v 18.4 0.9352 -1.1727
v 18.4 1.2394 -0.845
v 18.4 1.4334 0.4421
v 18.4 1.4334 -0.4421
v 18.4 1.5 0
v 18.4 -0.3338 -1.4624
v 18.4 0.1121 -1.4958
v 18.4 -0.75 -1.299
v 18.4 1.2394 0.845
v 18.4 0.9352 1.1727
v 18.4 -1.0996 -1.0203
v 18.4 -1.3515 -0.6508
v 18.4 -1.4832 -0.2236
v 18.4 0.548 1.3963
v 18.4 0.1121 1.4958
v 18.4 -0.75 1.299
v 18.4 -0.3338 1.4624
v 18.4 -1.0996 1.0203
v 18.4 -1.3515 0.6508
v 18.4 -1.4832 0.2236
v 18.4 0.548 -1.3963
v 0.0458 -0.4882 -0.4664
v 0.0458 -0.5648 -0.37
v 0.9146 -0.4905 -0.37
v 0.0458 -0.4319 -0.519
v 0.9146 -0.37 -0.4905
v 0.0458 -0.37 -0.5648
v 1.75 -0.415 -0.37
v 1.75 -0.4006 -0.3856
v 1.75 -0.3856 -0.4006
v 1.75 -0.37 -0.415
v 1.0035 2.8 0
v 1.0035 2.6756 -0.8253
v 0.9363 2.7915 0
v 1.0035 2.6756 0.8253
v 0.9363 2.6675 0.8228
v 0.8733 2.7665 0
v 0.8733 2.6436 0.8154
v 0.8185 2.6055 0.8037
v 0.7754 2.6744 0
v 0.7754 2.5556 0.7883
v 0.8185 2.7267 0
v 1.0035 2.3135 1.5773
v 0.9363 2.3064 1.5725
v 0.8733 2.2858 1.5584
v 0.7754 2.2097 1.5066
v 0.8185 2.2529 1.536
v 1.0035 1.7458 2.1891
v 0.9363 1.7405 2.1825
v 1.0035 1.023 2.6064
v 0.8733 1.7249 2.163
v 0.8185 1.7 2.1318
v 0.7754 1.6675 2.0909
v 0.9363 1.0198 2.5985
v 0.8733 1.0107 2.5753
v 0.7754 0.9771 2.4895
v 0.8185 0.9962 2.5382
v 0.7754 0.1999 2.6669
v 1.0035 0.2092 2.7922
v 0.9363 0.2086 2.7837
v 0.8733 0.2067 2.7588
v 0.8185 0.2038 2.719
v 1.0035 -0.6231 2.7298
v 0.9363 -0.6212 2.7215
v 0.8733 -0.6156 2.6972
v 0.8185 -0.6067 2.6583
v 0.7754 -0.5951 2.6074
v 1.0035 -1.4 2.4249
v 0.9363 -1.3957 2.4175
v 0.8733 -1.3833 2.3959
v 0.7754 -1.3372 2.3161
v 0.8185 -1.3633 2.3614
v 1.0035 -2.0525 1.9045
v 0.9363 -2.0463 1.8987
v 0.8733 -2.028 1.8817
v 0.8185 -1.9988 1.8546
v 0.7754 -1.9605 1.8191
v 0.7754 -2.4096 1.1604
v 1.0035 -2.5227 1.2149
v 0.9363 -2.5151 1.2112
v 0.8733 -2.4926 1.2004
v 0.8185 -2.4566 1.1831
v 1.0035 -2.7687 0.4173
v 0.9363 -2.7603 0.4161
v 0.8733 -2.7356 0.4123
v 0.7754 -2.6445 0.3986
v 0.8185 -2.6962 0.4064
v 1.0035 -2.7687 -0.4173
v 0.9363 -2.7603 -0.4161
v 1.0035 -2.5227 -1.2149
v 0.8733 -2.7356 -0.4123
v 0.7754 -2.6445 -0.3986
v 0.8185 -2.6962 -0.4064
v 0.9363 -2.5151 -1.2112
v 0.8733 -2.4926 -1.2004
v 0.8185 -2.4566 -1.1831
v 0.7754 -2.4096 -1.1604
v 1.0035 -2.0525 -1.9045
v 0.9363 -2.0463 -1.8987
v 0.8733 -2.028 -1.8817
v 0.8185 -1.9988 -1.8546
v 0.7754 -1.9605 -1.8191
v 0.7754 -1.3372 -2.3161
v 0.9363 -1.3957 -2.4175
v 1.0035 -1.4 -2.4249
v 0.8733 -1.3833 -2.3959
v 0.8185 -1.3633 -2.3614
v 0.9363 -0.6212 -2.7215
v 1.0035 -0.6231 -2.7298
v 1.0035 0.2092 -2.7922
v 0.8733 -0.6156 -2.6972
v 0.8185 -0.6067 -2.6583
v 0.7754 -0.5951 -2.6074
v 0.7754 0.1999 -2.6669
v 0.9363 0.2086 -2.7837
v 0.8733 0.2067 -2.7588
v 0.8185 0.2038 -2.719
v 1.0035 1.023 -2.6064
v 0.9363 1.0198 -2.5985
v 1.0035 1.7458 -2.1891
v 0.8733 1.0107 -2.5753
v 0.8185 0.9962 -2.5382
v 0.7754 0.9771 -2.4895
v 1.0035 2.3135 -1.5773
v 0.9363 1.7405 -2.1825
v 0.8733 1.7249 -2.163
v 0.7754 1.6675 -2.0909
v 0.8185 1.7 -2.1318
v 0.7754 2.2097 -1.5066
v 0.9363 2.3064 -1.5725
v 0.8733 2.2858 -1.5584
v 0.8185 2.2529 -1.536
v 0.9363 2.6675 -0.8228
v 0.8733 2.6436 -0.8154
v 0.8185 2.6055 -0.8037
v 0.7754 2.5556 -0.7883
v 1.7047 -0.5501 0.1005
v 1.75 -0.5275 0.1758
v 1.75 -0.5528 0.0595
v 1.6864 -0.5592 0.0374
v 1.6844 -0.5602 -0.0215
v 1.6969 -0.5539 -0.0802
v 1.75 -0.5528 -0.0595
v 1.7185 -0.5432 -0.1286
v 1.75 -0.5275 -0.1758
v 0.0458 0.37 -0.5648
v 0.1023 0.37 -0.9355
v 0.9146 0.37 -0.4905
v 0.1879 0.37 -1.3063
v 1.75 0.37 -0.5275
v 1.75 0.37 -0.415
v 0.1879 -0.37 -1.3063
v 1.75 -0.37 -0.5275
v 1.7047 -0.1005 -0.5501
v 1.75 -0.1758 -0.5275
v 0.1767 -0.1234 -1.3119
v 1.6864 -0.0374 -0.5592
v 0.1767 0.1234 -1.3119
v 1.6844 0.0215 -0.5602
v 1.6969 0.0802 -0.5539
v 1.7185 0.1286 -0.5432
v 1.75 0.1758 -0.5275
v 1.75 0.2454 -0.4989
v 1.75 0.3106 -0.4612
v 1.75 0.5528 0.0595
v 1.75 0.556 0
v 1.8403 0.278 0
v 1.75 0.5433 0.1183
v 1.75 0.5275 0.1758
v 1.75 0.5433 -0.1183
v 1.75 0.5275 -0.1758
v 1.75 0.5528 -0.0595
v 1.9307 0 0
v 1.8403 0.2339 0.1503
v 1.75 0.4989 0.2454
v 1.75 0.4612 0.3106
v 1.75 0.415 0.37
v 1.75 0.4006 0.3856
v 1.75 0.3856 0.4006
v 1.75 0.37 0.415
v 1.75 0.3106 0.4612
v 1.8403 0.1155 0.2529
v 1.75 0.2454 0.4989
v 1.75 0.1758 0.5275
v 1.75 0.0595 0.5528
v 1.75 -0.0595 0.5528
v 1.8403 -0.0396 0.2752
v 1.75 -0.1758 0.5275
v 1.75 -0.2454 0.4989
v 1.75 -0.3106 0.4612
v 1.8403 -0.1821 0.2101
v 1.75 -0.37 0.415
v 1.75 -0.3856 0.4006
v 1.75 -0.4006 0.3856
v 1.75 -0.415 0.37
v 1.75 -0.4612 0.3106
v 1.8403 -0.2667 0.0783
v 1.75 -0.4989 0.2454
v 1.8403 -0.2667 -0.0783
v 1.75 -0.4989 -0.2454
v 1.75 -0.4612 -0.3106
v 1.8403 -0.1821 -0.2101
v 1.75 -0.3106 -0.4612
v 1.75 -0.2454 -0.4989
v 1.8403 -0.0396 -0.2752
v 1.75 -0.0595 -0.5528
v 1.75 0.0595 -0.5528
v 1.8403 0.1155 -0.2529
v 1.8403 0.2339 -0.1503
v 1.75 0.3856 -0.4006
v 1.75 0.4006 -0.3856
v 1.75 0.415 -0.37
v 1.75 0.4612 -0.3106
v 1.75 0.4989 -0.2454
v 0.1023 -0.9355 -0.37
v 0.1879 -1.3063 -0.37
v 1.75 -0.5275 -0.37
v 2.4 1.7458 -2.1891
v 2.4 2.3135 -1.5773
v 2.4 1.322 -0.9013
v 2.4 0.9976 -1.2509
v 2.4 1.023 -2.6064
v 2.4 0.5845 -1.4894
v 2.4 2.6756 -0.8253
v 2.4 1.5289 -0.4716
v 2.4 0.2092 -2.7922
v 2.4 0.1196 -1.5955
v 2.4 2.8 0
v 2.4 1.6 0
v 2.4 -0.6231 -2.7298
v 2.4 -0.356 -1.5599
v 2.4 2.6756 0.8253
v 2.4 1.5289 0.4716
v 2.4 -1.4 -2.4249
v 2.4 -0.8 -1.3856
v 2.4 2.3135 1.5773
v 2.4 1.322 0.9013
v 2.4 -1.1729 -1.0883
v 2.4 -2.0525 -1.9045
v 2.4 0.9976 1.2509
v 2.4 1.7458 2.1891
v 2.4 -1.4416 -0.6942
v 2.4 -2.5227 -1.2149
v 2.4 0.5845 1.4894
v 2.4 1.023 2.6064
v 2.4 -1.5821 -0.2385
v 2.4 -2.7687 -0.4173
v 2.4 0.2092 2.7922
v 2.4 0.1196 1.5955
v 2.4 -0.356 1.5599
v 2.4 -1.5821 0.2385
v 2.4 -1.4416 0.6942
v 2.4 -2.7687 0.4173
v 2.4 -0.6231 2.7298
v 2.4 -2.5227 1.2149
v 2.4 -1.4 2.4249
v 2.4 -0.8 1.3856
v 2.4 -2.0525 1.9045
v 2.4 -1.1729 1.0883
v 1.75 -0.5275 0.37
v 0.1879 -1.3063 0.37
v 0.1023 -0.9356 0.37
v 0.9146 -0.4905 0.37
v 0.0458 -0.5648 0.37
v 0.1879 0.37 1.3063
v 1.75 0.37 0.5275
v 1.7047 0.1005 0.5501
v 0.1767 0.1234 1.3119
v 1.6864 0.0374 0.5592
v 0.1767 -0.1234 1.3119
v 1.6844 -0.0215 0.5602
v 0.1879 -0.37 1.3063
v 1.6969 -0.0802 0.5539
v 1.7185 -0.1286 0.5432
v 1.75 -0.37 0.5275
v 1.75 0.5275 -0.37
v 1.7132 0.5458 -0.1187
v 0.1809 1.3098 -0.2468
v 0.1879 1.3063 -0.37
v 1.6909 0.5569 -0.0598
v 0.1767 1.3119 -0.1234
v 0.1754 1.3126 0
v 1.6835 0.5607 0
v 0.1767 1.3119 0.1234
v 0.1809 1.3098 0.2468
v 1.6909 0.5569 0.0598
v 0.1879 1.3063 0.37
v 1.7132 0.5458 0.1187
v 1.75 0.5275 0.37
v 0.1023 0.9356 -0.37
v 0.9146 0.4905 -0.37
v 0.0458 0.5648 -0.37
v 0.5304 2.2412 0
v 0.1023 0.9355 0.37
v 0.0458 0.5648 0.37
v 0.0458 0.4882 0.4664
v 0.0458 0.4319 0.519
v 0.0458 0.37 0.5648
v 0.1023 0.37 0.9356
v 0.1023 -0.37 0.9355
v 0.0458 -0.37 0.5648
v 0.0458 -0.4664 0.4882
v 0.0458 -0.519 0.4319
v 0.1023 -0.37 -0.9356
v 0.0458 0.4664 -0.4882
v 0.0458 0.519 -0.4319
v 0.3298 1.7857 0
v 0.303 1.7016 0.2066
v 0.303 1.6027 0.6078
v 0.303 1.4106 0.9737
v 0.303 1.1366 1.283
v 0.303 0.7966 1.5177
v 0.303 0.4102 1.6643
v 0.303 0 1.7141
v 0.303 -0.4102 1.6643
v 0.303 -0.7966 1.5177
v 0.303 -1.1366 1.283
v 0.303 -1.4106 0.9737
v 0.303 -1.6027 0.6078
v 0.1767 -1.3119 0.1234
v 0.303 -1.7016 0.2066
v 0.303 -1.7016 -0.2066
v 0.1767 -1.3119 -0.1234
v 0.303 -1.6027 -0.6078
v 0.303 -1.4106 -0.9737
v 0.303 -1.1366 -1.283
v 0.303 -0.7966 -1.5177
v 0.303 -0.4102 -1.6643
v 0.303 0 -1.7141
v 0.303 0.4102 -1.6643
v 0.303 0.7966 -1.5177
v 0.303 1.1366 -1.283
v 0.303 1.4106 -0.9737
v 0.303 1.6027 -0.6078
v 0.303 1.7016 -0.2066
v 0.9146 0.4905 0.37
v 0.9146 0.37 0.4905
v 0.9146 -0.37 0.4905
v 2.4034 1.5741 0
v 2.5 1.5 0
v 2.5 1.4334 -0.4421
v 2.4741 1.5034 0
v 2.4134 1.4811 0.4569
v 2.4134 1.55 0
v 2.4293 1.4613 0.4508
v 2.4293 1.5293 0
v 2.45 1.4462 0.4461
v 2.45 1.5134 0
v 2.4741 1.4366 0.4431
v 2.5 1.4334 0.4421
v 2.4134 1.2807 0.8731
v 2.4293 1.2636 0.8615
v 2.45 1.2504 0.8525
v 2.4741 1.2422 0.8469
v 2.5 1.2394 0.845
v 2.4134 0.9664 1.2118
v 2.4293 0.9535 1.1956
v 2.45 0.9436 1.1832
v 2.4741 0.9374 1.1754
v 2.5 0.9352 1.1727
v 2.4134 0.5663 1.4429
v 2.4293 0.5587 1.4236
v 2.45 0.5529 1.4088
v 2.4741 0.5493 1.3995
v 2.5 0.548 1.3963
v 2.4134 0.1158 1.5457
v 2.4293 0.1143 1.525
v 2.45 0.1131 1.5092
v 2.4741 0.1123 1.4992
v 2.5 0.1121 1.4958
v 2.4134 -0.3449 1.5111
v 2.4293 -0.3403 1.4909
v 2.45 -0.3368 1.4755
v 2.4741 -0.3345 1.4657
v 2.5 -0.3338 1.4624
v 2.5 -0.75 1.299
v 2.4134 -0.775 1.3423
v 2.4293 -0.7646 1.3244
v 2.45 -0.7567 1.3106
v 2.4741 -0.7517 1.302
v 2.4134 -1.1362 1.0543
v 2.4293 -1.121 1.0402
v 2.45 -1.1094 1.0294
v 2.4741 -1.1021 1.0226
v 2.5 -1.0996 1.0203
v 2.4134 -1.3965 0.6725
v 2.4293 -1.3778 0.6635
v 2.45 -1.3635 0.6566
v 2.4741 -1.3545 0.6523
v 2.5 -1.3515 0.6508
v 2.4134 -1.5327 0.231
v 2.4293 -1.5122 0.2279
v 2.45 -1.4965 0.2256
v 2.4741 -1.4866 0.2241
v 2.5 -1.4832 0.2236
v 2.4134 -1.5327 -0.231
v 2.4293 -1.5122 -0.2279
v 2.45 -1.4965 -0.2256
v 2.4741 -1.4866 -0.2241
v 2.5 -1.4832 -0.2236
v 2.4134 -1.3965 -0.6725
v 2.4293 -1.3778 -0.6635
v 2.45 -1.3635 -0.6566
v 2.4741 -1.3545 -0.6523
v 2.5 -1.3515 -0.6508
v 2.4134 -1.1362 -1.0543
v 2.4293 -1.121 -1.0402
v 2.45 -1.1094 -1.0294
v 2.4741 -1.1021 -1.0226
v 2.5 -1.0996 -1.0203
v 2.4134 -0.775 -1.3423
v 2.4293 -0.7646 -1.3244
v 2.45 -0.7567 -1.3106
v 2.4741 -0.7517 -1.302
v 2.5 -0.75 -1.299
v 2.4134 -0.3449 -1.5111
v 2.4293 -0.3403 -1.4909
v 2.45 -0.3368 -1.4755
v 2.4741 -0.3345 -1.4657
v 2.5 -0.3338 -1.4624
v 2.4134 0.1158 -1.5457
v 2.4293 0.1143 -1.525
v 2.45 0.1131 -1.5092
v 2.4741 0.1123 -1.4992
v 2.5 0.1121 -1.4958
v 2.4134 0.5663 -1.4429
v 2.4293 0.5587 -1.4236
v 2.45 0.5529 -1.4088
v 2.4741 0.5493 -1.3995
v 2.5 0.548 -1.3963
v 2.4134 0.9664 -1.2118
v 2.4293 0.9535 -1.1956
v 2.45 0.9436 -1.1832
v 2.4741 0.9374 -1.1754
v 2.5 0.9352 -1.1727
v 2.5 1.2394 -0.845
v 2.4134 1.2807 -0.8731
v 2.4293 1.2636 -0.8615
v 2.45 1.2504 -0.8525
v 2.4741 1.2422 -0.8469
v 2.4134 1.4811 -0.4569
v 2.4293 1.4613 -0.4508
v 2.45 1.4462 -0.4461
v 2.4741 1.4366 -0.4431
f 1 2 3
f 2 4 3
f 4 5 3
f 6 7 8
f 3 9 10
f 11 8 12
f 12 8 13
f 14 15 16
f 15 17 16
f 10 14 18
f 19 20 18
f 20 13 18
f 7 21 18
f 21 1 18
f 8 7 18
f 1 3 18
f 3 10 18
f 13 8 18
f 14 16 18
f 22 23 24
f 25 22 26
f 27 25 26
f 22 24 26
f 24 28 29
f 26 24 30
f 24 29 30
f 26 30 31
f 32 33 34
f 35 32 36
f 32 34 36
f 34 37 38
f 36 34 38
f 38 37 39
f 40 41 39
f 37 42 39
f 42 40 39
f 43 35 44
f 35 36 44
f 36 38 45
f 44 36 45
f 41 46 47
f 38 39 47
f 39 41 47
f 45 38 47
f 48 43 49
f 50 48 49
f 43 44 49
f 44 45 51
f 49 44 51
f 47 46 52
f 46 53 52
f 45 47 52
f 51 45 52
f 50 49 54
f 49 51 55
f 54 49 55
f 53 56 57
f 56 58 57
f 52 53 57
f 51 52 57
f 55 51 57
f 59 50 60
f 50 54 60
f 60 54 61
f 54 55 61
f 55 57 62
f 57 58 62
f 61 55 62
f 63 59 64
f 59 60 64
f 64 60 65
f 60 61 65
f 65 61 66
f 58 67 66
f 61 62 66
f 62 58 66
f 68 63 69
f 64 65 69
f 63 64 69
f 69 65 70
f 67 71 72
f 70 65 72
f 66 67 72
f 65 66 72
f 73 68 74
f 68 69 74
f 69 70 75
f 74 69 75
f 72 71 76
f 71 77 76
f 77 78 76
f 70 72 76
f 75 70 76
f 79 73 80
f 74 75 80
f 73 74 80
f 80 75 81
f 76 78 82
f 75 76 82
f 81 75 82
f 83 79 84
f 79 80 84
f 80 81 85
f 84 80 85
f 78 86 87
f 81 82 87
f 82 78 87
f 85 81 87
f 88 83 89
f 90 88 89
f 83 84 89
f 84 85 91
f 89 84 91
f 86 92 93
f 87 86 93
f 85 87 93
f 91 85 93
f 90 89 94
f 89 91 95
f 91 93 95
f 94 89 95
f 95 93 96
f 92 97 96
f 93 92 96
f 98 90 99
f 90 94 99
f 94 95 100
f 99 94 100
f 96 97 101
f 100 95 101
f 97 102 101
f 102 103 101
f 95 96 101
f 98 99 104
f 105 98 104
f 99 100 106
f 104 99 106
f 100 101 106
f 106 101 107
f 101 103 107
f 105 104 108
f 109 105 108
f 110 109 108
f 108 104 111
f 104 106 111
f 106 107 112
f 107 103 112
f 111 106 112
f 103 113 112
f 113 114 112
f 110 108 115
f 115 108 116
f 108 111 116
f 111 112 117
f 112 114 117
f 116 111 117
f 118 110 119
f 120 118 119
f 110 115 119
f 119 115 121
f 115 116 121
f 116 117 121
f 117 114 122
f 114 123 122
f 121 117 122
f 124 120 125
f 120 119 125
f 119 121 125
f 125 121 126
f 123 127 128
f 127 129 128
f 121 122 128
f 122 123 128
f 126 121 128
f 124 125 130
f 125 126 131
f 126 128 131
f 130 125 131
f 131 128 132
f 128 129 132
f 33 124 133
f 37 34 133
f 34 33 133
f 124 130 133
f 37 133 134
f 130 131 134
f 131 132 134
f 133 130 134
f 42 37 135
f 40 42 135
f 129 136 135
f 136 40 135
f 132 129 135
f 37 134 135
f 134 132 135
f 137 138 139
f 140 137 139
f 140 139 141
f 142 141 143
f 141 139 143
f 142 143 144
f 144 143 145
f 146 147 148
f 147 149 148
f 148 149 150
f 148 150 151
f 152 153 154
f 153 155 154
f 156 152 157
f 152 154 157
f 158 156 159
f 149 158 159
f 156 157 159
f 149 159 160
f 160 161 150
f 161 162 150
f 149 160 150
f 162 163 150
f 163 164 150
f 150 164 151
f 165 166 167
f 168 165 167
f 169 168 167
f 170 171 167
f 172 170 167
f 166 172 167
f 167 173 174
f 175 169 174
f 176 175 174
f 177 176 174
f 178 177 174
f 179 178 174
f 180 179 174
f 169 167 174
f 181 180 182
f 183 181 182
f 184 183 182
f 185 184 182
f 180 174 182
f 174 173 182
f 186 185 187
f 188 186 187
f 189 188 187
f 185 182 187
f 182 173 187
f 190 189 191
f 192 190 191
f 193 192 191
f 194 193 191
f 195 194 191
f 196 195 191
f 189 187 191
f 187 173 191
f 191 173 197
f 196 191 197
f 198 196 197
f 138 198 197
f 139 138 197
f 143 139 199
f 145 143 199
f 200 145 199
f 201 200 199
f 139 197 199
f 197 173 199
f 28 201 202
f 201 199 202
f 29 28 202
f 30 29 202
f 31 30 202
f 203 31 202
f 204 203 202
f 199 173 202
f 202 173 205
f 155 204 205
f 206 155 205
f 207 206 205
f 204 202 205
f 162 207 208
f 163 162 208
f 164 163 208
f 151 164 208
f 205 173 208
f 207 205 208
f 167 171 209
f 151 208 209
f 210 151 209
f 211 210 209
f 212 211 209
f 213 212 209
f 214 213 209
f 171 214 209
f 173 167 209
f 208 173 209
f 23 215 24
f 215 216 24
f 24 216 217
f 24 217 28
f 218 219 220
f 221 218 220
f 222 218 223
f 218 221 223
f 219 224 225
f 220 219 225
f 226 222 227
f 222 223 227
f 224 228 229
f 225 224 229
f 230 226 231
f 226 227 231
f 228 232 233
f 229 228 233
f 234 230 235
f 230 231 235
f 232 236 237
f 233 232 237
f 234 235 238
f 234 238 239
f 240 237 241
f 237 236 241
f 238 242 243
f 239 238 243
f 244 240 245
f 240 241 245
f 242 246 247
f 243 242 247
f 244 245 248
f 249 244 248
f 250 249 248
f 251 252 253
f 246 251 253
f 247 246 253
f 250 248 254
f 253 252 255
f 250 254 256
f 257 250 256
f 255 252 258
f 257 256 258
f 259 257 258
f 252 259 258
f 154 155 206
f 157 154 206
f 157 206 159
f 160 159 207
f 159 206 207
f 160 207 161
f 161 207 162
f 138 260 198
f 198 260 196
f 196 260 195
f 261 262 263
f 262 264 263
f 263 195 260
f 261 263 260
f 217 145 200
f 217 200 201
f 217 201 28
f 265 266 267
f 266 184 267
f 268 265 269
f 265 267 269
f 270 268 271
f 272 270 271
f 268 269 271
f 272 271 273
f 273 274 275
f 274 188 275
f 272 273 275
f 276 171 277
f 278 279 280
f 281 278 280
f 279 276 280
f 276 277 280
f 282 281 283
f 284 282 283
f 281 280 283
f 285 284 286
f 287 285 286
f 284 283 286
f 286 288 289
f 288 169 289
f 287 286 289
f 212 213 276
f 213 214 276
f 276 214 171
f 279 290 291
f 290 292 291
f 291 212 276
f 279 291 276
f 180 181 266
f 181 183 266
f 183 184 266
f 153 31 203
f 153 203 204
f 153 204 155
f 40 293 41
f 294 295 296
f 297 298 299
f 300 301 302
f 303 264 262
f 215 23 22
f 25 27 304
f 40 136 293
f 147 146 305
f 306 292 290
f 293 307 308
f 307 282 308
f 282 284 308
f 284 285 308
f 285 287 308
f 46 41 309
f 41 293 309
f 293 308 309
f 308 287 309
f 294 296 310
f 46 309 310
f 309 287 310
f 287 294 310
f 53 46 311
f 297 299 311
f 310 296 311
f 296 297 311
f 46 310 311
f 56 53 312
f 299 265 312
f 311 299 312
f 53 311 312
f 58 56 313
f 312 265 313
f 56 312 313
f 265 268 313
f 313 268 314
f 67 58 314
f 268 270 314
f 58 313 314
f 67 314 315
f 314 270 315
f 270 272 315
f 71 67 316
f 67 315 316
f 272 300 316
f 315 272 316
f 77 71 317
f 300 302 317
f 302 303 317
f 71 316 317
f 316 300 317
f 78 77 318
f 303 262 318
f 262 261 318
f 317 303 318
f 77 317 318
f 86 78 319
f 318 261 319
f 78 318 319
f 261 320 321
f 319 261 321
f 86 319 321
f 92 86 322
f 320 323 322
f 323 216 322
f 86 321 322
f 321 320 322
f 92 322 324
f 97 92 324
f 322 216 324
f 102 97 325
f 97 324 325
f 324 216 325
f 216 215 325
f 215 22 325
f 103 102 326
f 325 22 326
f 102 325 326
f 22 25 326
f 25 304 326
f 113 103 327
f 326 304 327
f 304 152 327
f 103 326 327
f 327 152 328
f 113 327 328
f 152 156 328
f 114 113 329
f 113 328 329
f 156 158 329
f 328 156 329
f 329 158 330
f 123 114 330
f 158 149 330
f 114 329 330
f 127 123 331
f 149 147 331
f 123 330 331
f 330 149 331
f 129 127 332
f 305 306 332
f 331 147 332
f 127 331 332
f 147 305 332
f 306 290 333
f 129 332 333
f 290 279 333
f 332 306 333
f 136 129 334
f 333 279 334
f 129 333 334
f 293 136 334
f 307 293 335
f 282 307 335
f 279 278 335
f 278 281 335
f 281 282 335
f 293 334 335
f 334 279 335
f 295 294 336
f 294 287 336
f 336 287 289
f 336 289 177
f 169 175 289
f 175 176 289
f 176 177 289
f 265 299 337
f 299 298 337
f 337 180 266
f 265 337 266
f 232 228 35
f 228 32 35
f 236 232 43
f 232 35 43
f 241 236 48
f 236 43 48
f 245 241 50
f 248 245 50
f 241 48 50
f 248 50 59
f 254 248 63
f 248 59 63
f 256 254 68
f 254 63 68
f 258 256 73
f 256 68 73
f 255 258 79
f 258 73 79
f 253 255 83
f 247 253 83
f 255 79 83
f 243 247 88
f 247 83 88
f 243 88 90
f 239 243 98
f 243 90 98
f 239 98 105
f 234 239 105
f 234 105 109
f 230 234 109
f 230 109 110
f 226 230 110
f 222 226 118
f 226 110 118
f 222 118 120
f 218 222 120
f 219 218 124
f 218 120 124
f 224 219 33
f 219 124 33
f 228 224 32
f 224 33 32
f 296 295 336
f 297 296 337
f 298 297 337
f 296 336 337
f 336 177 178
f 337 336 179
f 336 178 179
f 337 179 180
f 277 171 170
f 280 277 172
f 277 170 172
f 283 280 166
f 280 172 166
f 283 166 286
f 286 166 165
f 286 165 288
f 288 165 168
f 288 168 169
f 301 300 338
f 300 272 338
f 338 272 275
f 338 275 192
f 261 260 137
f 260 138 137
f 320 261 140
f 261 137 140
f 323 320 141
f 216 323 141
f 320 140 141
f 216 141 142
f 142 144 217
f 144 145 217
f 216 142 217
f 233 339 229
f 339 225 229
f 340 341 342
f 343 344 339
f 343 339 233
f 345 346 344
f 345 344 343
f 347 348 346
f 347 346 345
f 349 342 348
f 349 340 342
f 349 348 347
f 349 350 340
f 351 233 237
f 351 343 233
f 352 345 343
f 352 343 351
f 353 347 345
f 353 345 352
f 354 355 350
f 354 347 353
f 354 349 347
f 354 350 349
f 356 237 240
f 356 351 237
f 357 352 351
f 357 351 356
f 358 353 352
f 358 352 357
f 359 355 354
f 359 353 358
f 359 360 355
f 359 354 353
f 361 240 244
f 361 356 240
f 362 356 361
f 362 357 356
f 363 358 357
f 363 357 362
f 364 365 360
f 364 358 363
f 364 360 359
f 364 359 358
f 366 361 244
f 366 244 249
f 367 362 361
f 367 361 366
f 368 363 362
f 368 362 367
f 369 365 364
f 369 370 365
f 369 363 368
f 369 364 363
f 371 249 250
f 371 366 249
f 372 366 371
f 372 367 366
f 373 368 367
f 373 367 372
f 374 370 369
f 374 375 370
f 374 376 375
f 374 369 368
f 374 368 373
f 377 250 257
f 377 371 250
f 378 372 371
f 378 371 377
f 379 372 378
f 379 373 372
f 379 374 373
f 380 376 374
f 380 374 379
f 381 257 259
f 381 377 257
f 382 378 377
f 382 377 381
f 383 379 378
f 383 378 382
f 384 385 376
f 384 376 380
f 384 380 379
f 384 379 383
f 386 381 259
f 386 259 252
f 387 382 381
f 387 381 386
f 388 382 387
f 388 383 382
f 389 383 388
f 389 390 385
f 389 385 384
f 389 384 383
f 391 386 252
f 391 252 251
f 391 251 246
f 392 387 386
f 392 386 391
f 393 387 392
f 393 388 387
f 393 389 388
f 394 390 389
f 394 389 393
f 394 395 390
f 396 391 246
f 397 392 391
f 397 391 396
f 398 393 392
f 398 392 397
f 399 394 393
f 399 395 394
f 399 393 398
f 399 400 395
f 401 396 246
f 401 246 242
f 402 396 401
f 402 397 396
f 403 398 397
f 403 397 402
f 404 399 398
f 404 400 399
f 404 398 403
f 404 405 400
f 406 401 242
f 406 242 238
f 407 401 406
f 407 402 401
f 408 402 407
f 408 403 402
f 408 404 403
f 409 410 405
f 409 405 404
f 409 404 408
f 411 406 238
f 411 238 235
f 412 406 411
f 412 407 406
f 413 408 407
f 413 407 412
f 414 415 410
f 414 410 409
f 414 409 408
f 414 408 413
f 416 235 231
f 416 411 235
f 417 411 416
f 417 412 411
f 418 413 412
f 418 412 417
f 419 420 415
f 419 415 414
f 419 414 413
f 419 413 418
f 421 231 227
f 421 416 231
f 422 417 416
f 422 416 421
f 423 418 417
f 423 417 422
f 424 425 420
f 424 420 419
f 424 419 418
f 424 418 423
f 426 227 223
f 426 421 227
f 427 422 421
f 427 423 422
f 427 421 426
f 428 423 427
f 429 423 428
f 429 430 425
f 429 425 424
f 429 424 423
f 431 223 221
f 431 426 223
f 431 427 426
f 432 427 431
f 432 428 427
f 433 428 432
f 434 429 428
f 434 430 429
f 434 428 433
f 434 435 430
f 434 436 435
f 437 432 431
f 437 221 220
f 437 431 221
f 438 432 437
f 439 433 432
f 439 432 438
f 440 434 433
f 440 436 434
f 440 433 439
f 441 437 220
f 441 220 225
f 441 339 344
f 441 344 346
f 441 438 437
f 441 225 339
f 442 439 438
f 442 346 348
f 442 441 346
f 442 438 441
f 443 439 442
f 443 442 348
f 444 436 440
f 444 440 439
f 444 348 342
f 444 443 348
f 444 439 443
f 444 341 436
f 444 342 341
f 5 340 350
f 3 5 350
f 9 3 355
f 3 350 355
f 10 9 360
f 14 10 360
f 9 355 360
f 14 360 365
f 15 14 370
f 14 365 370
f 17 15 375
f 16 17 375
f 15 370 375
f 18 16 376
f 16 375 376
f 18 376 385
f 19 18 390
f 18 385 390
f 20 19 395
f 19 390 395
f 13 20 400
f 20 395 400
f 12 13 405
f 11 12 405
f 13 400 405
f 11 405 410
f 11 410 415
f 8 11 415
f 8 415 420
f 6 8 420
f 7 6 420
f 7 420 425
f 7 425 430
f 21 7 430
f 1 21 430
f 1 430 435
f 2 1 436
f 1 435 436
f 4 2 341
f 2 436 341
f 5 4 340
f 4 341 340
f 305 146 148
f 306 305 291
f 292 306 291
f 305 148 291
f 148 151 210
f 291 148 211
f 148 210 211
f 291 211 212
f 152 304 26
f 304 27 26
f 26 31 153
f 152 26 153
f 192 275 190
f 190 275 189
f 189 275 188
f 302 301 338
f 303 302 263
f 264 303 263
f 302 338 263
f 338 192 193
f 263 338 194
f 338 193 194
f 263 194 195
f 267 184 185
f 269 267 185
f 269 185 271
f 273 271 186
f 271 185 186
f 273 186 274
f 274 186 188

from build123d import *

# Parameters (mm, degrees)
FILLET1_R    = 0.1
SKETCH3_W    = 0.74
SKETCH3_H    = 2.8
SKETCH4_W    = 0.74
SKETCH4_H    = 1.054964664
RECPAT_COUNT = 2
RECPAT_ANGLE = 90


with BuildPart() as part:
    # BodySke → Base-Revolve (revolve)
    with BuildSketch(Plane.XY):
        with BuildLine():
            Line((2.4, 1.5), (2.4, 2.8))
            Line((2.4, 2.8), (1.003501533, 2.8))
            ThreePointArc((1.003501533, 2.8), (0.873295971, 2.76653015), (0.775371599, 2.674418605))
            ThreePointArc((0.775371599, 2.674418605), (0.197753546, 1.392274756), (0, 0))
            Line((0, 0), (18.4, 0))
            Line((18.4, 0), (18.4, 1.5))
            Line((18.4, 1.5), (2.4, 1.5))
        make_face()
    revolve(axis=Axis((-25.4, 0, 0), (1, 0, 0)))

    # Fillet1
    fillet1_edges = [part.edges().sort_by_distance(p)[0] for p in [
        (2.4, -1.5, 0),
    ]]
    fillet(fillet1_edges, radius=FILLET1_R)

    # Sketch3 → Recess section 0
    with BuildSketch(Plane(origin=(0, 0, 0), x_dir=(0, 0, -1), z_dir=(1, 0, 0))):
        Rectangle(SKETCH3_W, SKETCH3_H)
    # Sketch4 → Recess section 1
    with BuildSketch(Plane(origin=(1.75, 0, 0), x_dir=(0, 0, -1), z_dir=(1, 0, 0))):
        Rectangle(SKETCH4_W, SKETCH4_H)
    recess = loft(mode=Mode.SUBTRACT)

    # RecPat: Recess ×2 about axis
    recpat_axis = Axis((0, 0, 0), (1, 0, 0))
    for i in range(1, RECPAT_COUNT):
        add(recess.rotate(recpat_axis, i * RECPAT_ANGLE / (RECPAT_COUNT - 1)), mode=Mode.SUBTRACT)

    # RecCorSke → RecessCore (revolve, cut)
    with BuildSketch(Plane.XY):
        Polygon((0, 0), (0, 0.678371921), (1.75, 0.556), (1.930655351, 0), align=None)
    revolve(axis=Axis((-3.175, 0, 0), (1, 0, 0)), mode=Mode.SUBTRACT)


solid = part.part
